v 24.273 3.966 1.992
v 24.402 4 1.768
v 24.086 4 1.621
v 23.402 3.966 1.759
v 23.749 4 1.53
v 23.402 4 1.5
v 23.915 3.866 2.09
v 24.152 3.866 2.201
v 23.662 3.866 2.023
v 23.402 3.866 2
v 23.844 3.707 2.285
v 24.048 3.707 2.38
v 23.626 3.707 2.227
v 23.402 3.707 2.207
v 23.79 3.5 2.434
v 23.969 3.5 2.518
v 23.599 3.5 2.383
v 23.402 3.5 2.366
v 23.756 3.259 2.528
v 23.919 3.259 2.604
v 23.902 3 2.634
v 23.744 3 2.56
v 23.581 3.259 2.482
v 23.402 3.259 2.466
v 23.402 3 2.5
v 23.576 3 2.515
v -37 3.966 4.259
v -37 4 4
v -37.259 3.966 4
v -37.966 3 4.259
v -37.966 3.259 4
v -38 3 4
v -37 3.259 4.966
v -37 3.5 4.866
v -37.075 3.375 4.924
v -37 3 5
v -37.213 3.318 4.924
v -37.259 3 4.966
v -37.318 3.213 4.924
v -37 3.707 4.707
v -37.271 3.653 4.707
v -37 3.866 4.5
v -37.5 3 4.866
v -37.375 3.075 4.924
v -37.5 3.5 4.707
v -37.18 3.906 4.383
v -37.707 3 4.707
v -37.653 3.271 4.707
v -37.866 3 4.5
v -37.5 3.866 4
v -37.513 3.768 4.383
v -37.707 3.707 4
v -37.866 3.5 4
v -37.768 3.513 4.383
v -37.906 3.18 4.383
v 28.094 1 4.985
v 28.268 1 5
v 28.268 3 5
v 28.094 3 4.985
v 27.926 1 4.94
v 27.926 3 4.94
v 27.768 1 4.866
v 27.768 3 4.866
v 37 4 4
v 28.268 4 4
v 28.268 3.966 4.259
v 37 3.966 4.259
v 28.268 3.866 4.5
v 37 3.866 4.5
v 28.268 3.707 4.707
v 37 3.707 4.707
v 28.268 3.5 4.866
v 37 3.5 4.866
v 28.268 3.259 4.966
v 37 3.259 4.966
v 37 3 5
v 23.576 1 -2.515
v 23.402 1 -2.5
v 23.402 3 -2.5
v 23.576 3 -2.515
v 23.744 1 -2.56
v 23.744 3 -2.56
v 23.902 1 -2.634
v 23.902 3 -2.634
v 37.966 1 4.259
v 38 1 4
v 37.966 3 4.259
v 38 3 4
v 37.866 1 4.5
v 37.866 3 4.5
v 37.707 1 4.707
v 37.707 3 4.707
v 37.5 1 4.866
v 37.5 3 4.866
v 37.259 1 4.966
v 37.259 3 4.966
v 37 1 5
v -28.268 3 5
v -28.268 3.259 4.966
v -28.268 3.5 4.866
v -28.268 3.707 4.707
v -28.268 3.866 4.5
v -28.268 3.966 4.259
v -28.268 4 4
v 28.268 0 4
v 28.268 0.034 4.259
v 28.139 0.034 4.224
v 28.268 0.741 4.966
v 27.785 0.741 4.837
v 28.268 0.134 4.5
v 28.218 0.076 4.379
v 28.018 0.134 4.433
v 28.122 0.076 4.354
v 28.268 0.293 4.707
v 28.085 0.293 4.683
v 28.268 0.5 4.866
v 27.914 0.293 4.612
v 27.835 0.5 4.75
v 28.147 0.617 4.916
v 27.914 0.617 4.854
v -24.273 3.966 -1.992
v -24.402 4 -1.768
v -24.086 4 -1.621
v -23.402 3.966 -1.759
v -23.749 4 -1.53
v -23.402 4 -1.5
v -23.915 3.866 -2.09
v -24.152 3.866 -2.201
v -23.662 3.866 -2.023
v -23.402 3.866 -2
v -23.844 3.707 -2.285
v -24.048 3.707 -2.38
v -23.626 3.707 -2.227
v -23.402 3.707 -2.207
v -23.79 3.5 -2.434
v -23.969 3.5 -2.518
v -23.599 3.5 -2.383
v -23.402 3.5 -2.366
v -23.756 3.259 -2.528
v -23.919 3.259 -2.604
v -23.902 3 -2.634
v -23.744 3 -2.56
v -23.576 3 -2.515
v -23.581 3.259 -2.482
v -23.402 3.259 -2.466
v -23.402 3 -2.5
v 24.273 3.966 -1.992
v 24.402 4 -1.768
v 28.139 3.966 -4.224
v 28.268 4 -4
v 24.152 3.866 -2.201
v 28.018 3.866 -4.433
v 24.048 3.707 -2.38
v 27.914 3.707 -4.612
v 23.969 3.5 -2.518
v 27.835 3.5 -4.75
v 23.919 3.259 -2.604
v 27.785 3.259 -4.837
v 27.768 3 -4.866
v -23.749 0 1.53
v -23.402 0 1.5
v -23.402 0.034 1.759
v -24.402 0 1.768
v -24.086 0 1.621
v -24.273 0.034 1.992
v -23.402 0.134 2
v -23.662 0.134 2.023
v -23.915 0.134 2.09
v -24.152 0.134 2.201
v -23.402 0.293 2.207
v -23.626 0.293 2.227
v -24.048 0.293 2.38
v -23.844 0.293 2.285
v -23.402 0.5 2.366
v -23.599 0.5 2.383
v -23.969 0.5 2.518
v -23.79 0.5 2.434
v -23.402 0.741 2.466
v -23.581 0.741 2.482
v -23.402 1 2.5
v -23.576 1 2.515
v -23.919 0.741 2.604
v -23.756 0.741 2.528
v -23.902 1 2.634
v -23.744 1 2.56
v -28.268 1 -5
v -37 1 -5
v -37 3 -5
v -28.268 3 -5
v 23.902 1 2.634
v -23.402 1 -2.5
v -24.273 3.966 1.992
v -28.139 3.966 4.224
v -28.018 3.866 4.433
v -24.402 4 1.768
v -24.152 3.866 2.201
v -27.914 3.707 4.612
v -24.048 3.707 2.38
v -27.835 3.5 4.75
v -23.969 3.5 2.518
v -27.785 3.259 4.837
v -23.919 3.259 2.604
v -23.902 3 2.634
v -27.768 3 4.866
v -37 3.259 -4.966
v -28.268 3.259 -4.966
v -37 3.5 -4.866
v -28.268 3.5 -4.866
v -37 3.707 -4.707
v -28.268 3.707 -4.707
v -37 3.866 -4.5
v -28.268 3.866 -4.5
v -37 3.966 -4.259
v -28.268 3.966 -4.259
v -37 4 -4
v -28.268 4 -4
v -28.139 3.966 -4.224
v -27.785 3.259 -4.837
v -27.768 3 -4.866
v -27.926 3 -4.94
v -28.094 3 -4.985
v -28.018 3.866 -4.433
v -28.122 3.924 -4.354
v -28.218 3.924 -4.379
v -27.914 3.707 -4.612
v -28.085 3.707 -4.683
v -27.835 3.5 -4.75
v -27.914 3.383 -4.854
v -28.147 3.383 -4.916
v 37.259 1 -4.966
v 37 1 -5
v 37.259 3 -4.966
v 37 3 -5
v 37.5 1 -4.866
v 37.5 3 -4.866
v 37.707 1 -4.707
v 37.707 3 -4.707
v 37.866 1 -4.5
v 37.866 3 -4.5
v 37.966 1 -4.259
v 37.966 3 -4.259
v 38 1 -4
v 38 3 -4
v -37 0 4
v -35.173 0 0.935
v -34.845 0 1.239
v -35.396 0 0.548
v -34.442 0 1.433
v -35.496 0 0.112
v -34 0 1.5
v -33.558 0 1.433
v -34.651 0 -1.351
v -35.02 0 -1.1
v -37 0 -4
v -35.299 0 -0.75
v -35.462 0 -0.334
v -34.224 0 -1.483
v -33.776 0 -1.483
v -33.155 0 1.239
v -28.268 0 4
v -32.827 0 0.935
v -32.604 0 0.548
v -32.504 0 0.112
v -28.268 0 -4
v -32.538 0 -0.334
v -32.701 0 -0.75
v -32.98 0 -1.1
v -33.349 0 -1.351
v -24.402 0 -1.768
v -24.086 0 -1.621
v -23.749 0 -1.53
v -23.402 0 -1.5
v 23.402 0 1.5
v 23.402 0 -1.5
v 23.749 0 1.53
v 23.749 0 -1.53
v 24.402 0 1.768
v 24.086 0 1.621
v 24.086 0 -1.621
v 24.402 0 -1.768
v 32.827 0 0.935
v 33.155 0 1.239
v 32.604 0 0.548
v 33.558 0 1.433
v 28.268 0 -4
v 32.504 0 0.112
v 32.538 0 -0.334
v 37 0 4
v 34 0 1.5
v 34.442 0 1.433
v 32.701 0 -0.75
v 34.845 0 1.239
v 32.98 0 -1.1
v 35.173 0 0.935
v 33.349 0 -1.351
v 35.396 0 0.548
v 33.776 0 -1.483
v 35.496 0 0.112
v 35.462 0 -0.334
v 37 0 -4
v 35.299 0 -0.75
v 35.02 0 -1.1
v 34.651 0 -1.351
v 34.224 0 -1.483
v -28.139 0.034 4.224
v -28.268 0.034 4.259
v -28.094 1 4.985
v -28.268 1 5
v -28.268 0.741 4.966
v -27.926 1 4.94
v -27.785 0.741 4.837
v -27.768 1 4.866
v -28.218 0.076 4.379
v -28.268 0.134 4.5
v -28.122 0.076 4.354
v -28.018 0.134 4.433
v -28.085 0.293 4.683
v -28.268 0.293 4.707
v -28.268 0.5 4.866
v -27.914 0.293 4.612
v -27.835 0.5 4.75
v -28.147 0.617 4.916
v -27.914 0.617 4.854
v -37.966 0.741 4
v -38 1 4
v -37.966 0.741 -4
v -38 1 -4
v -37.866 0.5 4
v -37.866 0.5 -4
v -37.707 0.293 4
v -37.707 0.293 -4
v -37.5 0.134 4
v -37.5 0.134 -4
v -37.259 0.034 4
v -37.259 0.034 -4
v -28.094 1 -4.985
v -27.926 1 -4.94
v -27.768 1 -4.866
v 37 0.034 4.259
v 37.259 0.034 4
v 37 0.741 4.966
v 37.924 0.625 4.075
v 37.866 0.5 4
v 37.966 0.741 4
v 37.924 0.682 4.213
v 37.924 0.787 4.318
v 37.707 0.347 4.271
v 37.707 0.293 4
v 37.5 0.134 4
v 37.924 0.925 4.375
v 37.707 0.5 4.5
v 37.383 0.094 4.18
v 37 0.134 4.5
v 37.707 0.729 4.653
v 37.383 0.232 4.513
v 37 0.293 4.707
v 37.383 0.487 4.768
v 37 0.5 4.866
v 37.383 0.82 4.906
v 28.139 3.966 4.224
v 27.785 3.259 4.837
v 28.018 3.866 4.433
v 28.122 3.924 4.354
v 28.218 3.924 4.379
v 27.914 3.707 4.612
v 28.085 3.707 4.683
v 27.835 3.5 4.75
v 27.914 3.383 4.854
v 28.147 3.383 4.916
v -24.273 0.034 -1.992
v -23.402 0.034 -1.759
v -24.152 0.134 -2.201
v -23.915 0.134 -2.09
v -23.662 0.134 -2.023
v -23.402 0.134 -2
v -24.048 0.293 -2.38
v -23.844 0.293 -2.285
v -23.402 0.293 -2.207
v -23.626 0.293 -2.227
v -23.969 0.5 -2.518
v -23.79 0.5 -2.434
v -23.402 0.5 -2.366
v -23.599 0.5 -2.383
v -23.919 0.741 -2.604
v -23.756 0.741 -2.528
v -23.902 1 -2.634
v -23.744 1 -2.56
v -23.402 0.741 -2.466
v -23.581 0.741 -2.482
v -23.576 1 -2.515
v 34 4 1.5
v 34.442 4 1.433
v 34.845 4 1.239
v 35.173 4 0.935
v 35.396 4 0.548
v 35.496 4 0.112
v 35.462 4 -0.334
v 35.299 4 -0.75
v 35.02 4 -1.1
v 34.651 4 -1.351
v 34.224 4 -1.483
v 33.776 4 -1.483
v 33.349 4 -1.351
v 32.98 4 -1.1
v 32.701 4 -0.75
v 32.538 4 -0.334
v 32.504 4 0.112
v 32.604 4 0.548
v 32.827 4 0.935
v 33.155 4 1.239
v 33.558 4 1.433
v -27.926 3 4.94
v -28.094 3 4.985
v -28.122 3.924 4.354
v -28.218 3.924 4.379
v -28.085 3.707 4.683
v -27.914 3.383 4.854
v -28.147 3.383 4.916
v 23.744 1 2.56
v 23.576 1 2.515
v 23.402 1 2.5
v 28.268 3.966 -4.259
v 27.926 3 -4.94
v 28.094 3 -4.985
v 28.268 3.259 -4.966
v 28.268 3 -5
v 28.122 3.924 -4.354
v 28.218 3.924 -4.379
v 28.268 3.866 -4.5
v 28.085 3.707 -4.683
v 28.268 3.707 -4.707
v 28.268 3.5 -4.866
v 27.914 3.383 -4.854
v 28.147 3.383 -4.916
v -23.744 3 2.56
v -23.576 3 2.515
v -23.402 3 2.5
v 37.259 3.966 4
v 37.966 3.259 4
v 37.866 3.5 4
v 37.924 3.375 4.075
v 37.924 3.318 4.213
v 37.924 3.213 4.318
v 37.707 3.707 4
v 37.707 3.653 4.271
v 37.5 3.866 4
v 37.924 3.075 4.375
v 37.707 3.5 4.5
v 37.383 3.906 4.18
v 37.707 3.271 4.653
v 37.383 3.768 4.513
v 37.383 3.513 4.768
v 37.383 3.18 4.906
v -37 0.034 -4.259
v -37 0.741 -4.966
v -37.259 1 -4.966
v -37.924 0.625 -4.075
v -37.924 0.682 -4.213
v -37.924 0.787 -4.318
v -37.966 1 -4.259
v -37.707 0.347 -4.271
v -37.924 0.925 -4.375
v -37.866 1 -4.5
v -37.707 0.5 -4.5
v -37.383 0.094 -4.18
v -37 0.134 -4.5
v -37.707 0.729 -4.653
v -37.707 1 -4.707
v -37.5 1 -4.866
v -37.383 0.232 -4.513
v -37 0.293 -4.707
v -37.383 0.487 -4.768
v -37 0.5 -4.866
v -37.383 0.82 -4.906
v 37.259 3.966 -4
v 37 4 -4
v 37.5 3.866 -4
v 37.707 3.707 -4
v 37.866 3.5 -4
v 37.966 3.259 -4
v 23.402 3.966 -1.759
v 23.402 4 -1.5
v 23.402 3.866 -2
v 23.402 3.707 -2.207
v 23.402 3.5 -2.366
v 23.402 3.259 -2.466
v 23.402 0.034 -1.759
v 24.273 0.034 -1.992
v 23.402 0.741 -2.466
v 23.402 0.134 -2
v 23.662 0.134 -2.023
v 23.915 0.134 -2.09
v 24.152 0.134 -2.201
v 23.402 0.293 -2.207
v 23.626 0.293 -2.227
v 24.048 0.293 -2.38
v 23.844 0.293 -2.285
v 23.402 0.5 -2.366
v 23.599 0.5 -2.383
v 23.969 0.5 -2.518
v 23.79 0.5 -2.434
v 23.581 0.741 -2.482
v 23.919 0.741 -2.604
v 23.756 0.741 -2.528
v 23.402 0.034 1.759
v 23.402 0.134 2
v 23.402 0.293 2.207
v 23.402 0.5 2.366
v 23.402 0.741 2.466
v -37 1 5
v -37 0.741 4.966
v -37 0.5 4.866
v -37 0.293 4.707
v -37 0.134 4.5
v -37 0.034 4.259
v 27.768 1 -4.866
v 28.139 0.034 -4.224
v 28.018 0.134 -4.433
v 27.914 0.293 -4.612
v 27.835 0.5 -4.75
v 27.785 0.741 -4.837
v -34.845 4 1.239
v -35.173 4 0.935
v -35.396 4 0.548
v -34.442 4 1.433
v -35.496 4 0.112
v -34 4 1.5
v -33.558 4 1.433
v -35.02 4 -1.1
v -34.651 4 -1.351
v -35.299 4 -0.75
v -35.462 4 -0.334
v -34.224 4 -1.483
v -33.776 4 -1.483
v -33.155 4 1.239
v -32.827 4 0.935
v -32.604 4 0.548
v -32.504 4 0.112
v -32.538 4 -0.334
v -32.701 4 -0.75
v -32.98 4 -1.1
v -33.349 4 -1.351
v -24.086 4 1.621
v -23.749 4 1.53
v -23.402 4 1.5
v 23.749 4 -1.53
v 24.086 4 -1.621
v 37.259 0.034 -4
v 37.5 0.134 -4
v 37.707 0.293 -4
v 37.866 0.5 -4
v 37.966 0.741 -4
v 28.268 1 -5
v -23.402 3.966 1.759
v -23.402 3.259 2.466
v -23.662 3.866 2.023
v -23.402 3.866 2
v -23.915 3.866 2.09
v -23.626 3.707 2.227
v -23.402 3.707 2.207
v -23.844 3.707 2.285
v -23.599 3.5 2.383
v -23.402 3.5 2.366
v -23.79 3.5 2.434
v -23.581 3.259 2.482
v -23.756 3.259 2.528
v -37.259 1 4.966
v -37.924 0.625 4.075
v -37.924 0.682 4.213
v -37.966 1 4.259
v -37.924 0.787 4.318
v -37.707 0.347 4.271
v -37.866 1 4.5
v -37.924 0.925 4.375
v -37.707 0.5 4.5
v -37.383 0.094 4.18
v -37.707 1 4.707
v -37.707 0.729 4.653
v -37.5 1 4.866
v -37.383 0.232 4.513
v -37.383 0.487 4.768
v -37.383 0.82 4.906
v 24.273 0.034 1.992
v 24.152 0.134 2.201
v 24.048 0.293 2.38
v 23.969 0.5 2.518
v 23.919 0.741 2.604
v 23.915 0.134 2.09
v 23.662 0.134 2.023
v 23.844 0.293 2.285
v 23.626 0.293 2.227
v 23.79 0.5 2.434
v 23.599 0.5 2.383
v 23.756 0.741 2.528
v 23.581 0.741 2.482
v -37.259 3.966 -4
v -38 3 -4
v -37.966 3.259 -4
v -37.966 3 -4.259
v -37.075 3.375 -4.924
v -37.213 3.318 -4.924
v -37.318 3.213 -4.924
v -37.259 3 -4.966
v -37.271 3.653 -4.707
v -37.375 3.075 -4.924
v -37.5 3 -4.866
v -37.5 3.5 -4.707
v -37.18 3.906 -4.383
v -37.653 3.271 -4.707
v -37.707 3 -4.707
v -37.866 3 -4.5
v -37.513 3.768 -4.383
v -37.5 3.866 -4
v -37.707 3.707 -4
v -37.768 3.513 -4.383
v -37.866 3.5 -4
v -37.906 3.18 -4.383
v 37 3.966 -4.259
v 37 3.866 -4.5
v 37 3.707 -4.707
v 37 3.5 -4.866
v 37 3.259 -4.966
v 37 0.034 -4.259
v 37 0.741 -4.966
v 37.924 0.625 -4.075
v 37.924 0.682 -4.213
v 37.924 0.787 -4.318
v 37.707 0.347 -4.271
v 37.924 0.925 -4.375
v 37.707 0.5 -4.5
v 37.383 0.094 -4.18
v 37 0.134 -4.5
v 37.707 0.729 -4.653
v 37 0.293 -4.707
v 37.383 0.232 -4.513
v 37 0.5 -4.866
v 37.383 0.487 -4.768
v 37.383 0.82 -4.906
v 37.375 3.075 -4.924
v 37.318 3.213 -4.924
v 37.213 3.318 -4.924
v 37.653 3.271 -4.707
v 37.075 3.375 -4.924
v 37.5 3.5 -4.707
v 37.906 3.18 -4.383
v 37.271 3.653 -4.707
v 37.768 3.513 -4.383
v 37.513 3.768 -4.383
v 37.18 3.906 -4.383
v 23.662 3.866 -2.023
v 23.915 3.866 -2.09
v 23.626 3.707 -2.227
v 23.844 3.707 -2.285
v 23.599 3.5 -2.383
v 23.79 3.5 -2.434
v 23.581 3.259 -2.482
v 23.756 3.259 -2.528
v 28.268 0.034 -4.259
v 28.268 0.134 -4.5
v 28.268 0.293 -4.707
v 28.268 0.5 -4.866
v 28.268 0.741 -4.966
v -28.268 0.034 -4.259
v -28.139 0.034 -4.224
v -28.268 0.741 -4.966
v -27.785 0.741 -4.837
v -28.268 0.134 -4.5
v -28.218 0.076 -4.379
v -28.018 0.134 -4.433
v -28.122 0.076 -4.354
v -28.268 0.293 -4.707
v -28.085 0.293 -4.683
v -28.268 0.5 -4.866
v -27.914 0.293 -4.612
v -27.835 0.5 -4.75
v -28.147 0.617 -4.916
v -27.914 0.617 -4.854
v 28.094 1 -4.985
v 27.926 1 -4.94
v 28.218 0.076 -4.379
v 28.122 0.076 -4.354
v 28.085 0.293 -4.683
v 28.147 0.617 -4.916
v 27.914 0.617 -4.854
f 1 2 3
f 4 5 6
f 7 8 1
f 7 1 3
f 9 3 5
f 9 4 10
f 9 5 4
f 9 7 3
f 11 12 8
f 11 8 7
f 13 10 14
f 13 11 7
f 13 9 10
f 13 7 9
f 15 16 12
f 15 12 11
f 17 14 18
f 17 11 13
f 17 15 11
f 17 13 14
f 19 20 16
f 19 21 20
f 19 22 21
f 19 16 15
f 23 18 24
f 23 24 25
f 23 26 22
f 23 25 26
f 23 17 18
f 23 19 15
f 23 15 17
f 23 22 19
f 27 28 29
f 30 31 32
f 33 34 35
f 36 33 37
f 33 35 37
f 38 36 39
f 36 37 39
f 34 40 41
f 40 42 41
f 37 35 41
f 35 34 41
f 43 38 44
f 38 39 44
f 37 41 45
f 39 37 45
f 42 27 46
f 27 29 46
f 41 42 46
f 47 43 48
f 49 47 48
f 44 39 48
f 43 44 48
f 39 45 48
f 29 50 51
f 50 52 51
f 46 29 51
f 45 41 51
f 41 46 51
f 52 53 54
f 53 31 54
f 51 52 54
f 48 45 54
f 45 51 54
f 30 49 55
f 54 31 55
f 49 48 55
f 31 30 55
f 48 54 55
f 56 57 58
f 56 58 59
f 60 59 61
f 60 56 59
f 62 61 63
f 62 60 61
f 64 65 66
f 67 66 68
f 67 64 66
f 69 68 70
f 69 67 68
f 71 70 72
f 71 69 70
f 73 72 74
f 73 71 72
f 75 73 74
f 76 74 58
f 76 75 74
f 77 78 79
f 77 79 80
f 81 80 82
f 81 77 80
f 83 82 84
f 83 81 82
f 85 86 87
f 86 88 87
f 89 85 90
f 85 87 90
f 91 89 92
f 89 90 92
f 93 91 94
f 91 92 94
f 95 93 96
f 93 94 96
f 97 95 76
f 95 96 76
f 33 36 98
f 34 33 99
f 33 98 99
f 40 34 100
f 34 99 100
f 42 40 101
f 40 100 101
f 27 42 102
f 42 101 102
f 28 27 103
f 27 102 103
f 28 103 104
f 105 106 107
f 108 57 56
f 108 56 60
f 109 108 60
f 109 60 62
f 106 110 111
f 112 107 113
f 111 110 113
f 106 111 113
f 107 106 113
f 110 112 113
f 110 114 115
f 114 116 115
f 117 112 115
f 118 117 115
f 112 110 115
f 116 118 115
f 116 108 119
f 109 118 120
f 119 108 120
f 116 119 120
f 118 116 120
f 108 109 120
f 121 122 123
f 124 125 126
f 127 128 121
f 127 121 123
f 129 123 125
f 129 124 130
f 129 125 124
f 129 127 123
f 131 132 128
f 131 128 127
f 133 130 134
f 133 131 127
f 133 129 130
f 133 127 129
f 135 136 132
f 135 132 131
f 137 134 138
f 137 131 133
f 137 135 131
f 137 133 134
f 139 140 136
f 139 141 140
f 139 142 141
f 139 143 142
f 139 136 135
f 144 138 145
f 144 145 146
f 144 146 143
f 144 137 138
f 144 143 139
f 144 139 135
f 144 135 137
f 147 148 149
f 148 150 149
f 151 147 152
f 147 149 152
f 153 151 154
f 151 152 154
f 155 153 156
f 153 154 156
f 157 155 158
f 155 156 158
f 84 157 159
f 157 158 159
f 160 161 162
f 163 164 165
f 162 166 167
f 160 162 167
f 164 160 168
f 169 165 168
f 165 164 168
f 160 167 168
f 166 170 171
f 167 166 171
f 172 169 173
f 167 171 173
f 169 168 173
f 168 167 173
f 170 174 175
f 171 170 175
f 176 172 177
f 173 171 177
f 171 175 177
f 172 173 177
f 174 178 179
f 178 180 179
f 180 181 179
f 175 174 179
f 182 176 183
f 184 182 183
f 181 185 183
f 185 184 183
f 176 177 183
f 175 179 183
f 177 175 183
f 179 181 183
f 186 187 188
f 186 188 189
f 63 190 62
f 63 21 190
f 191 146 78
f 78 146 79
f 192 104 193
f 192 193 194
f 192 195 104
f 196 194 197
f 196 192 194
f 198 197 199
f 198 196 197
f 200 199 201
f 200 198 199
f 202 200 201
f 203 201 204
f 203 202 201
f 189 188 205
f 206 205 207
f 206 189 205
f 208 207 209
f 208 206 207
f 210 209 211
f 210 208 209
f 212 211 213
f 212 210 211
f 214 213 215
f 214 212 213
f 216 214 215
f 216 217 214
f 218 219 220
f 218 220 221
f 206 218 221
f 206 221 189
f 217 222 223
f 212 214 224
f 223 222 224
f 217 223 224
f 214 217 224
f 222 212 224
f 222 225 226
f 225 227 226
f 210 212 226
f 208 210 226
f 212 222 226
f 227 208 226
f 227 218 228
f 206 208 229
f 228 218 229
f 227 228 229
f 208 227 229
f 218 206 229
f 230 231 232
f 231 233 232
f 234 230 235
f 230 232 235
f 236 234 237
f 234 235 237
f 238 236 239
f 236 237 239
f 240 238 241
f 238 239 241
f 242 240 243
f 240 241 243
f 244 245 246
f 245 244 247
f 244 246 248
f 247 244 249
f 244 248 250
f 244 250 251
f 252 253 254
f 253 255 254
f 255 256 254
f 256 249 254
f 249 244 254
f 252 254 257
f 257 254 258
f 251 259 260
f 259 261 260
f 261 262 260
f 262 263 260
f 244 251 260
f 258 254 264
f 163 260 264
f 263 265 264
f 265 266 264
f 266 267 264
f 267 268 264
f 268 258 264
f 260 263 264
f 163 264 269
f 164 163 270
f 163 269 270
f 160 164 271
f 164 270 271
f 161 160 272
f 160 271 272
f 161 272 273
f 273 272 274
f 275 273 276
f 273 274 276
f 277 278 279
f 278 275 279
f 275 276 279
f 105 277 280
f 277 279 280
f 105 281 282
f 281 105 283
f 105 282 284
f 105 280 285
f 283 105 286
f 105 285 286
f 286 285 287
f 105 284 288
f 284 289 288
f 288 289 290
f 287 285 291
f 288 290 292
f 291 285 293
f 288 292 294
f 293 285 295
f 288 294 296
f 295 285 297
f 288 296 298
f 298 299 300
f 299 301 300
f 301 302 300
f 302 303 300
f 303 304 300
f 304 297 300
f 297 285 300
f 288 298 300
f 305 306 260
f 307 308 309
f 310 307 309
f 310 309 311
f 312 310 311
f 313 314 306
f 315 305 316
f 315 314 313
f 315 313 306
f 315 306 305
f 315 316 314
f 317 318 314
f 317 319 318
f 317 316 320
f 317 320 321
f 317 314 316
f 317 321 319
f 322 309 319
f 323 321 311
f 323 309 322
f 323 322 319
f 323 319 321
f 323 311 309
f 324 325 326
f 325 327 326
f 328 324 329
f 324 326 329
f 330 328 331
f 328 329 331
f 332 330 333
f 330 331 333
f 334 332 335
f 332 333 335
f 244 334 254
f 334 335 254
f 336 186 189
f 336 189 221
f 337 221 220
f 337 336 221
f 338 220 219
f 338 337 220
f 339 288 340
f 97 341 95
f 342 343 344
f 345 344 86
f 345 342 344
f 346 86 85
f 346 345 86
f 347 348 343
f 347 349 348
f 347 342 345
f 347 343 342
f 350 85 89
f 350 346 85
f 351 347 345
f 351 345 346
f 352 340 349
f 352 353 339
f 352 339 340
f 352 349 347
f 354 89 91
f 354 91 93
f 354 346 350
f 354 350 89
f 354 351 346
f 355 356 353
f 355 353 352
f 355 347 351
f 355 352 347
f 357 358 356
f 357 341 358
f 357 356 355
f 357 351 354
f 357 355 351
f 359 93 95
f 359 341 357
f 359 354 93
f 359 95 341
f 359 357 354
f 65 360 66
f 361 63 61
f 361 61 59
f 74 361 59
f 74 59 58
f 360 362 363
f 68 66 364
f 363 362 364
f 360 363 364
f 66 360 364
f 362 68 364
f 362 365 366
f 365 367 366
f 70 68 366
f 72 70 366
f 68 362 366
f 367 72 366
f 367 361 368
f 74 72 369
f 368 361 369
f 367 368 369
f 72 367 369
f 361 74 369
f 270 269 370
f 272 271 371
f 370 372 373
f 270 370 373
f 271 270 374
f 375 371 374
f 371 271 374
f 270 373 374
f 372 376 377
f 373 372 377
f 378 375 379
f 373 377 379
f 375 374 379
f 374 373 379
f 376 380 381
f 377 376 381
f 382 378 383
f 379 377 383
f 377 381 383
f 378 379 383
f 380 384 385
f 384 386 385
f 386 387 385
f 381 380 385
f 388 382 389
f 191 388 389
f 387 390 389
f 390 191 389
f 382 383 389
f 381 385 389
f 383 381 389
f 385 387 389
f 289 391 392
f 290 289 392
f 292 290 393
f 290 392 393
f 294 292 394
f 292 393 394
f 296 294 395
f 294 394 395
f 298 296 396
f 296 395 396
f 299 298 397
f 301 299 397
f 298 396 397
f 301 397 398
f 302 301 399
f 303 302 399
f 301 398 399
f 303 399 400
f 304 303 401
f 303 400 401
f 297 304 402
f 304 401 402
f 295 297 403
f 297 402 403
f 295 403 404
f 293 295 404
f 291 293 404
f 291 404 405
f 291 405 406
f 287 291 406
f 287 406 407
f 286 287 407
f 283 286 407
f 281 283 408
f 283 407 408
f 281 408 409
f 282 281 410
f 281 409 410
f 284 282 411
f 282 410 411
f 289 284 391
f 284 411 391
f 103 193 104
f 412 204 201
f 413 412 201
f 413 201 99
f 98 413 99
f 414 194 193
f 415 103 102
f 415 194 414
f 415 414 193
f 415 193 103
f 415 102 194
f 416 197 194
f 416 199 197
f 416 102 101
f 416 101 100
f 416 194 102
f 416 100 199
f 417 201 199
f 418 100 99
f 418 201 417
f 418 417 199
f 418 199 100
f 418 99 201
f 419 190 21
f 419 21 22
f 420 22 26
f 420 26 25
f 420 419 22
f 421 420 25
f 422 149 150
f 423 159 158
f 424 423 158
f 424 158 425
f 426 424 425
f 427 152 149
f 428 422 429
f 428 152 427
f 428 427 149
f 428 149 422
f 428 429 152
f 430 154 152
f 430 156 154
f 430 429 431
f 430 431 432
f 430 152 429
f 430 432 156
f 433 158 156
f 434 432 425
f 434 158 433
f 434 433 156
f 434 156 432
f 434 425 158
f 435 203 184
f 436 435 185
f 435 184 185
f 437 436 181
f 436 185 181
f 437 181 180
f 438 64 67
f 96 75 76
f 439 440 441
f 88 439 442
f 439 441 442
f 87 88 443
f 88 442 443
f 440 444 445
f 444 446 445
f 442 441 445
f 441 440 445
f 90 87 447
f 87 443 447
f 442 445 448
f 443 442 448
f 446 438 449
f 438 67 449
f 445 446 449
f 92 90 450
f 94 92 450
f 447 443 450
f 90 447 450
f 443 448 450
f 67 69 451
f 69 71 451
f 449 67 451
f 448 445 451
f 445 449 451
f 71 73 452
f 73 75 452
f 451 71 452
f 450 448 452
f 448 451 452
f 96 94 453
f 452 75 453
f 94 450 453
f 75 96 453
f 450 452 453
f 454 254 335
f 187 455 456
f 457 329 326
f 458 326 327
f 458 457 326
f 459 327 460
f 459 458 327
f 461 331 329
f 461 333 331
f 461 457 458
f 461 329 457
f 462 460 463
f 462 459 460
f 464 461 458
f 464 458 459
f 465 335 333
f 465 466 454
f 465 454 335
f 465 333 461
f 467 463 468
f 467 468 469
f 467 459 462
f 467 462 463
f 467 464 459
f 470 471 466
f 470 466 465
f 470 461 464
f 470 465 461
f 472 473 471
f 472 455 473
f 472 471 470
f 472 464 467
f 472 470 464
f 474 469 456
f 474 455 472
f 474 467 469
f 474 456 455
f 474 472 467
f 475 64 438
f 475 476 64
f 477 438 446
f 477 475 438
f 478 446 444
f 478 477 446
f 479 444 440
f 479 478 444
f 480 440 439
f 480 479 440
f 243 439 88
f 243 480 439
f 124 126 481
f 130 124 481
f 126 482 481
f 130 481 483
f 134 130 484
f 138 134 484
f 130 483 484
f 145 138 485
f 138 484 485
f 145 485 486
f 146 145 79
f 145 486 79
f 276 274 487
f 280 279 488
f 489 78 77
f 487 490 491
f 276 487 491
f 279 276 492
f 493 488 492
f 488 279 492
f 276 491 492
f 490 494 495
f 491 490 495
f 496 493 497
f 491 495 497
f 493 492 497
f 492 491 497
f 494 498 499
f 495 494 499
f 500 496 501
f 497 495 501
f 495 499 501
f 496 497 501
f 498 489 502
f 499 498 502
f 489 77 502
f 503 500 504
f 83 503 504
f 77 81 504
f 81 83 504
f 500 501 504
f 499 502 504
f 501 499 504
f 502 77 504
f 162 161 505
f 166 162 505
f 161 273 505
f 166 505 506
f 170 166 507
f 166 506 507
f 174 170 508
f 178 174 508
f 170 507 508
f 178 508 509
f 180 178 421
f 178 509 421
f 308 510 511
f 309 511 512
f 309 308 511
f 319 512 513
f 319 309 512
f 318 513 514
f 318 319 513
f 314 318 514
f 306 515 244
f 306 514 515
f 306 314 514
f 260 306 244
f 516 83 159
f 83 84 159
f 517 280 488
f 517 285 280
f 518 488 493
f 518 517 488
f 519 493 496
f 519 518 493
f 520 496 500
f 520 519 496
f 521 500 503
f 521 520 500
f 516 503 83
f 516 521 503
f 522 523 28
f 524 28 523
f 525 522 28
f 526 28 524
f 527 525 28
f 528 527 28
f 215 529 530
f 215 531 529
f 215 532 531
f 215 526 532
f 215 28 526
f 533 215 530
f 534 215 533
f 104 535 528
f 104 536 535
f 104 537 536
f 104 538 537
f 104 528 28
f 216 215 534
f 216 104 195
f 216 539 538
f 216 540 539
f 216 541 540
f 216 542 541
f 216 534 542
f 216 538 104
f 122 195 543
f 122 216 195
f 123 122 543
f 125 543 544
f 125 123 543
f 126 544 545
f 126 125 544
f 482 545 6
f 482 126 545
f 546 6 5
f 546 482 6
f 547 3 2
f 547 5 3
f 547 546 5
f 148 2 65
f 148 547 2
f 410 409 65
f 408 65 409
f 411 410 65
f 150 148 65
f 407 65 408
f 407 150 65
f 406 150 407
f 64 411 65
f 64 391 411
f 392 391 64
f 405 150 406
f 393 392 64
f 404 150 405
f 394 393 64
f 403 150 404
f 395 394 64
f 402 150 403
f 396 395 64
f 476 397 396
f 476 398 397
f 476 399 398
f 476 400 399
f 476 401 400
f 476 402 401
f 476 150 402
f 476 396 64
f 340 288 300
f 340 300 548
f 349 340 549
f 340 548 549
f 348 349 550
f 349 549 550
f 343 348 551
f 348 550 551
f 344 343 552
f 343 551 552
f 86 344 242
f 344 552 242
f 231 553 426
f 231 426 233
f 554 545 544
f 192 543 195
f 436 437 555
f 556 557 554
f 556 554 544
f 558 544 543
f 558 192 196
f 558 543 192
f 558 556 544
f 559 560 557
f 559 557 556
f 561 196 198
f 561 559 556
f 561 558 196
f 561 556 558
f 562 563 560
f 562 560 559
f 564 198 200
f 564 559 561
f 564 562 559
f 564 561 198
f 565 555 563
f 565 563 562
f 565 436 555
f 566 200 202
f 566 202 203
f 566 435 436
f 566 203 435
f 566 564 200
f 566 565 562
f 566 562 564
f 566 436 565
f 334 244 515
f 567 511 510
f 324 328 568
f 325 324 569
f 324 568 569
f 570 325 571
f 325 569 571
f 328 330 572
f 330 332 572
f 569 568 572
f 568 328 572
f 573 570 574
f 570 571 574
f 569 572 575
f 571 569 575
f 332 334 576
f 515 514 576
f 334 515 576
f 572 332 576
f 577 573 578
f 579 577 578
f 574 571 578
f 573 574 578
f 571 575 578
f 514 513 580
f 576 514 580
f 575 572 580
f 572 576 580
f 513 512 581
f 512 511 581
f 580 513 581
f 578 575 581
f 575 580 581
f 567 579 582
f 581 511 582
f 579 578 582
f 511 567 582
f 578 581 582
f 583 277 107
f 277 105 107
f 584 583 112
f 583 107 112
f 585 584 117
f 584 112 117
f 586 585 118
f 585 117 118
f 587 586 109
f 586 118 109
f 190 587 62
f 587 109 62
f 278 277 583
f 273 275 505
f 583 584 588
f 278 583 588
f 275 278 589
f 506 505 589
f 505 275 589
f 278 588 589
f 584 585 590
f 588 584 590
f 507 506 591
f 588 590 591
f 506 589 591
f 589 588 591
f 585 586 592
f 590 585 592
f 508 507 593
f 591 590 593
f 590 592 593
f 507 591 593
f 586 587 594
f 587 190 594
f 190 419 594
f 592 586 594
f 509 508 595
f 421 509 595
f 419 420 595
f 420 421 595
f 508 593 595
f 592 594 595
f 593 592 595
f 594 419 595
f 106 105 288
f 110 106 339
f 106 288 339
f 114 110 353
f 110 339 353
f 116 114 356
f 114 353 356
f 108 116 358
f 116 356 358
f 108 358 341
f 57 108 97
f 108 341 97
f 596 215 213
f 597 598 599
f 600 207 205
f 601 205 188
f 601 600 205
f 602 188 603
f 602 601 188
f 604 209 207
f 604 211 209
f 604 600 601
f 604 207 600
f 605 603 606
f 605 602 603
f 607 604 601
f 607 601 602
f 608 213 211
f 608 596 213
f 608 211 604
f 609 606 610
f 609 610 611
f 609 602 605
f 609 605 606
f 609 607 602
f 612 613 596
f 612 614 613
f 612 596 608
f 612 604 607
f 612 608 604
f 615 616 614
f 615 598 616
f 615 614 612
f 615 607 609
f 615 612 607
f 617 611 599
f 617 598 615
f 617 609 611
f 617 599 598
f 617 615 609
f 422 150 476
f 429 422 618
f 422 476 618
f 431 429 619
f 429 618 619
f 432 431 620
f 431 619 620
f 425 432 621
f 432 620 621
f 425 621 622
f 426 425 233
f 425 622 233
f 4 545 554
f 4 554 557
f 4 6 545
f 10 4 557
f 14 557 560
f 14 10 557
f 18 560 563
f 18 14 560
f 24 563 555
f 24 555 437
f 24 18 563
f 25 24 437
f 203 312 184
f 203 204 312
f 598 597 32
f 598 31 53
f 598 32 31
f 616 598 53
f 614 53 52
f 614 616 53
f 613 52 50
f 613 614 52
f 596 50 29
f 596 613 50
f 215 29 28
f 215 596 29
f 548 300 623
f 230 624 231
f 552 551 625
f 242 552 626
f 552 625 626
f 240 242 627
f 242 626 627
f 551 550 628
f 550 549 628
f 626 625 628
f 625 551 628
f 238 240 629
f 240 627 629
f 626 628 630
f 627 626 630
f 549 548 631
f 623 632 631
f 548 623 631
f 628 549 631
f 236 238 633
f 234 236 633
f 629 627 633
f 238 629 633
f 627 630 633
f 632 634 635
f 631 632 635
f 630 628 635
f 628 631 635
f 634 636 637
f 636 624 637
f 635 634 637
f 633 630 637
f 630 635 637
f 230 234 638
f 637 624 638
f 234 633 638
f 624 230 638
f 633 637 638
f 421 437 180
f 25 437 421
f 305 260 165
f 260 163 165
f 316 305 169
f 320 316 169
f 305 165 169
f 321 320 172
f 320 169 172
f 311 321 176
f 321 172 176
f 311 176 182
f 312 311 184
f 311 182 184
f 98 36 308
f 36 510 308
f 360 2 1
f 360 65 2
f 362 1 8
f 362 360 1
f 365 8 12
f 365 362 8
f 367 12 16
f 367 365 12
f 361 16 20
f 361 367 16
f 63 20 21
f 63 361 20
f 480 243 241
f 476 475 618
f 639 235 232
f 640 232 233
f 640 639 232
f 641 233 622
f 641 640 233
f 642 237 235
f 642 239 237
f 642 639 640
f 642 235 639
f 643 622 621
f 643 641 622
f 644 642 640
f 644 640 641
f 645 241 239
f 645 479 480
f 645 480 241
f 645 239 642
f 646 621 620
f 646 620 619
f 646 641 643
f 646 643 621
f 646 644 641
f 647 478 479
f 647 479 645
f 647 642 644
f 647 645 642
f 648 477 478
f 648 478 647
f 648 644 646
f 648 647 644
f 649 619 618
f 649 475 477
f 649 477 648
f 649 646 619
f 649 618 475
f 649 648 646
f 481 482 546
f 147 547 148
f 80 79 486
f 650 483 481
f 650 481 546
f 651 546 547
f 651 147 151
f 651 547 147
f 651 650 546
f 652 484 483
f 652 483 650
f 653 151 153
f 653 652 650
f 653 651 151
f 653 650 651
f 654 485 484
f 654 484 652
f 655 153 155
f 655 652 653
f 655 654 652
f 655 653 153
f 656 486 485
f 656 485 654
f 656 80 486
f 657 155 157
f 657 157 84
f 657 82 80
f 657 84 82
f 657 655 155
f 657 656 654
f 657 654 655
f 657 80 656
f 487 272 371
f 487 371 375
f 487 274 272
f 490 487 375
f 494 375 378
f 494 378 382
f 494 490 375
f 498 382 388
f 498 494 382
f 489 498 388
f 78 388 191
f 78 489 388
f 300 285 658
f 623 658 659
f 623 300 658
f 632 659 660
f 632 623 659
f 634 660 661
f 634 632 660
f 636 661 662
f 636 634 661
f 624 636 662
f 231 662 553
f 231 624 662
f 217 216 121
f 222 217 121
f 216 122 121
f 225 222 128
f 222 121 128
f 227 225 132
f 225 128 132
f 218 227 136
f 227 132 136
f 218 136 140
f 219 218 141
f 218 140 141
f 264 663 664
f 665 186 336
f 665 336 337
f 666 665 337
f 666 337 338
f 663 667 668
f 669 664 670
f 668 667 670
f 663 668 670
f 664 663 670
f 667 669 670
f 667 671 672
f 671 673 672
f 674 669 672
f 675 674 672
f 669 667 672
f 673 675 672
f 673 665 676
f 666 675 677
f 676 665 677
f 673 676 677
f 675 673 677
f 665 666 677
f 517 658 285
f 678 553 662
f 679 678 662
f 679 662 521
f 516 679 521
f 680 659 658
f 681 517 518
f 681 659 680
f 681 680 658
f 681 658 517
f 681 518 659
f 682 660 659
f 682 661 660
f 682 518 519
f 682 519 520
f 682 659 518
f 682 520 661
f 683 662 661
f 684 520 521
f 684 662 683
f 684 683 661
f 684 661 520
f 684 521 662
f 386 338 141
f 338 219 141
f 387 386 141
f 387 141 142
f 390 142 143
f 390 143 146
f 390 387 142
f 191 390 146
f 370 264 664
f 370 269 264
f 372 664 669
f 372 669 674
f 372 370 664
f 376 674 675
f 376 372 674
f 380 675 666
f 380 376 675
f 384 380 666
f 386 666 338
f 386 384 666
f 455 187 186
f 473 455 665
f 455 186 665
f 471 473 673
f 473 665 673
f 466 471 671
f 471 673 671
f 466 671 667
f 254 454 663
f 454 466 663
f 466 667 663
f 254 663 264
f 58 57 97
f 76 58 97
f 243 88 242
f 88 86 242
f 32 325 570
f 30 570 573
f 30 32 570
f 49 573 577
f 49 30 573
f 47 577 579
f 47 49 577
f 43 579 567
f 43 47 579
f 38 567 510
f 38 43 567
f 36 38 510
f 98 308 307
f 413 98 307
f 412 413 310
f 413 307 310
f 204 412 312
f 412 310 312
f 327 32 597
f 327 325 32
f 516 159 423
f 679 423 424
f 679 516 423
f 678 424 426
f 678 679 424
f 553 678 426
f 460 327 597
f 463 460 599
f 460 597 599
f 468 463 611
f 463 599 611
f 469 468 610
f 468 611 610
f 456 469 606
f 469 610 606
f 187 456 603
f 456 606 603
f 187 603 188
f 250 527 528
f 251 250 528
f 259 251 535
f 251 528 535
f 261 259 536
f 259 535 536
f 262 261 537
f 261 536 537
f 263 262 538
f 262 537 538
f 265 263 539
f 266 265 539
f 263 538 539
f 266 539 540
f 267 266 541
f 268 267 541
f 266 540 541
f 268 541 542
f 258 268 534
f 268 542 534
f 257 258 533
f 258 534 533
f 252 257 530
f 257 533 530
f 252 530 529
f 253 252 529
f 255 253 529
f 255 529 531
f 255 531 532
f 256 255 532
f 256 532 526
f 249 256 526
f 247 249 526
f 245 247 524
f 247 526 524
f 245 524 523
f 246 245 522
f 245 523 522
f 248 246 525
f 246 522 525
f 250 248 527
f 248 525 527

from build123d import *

# Parameters (mm, degrees)
SKETCH1_W           = 76
SKETCH1_H           = 10
BOSS_EXTRUDE1_DEPTH = 4
SKETCH2_R           = 1.5
CUT_EXTRUDE1_DEPTH  = 4
CUT_EXTRUDE2_DEPTH  = 10
FILLET1_R           = 1


with BuildPart() as part:
    # Sketch1 → Boss-Extrude1 (new body)
    with BuildSketch(Plane(origin=(0, 0, 0), x_dir=(1, 0, 0), z_dir=(0, 1, 0))):
        Rectangle(SKETCH1_W, SKETCH1_H)
    extrude(amount=BOSS_EXTRUDE1_DEPTH)

    # Sketch2 → Cut-Extrude1 (cut)
    with BuildSketch(Plane(origin=(0, 4, 0), x_dir=(1, 0, 0), z_dir=(0, 1, 0))):
        with Locations(Location((-34, 0, 0), (0, 0, 270))):
            Circle(SKETCH2_R)
        with Locations(Location((34, 0, 0), (0, 0, 270))):
            Circle(SKETCH2_R)
    extrude(amount=-CUT_EXTRUDE1_DEPTH, mode=Mode.SUBTRACT)

    # Sketch3 → Cut-Extrude2 (cut)
    with BuildSketch(Plane(origin=(0, 4, 0), x_dir=(1, 0, 0), z_dir=(0, 1, 0))):
        Polygon((-28, 5), (-23.669872981, 2.5), (23.669872981, 2.5), (28, 5), align=None)
        Polygon((-28, -5), (-23.669872981, -2.5), (23.669872981, -2.5), (28, -5), align=None)
    extrude(amount=-CUT_EXTRUDE2_DEPTH, mode=Mode.SUBTRACT)

    # Fillet1
    fillet1_edges = [part.edges().sort_by_distance(p)[0] for p in [
        (-38, 4, 0),
        (-33, 4, 5),
        (33, 0, 5),
        (-33, 0, -5),
        (25.834936491, 0, 3.75),
        (0, 0, 2.5),
        (-25.834936491, 0, 3.75),
        (-25.834936491, 0, -3.75),
        (0, 0, -2.5),
        (25.834936491, 0, -3.75),
        (-33, 4, -5),
        (33, 4, 5),
        (-28, 2, -5),
        (28, 2, -5),
        (23.669872981, 2, -2.5),
        (-23.669872981, 2, -2.5),
        (-25.834936491, 4, -3.75),
        (0, 4, -2.5),
        (25.834936491, 4, -3.75),
        (28, 2, 5),
        (-28, 2, 5),
        (-23.669872981, 2, 2.5),
        (23.669872981, 2, 2.5),
        (25.834936491, 4, 3.75),
        (0, 4, 2.5),
        (-25.834936491, 4, 3.75),
        (38, 4, 0),
        (-33, 0, 5),
        (-38, 0, 0),
        (33, 0, -5),
        (38, 0, 0),
        (38, 2, 5),
        (-38, 2, 5),
        (-38, 2, -5),
        (38, 2, -5),
        (33, 4, -5),
    ]]
    fillet(fillet1_edges, radius=FILLET1_R)


solid = part.part
